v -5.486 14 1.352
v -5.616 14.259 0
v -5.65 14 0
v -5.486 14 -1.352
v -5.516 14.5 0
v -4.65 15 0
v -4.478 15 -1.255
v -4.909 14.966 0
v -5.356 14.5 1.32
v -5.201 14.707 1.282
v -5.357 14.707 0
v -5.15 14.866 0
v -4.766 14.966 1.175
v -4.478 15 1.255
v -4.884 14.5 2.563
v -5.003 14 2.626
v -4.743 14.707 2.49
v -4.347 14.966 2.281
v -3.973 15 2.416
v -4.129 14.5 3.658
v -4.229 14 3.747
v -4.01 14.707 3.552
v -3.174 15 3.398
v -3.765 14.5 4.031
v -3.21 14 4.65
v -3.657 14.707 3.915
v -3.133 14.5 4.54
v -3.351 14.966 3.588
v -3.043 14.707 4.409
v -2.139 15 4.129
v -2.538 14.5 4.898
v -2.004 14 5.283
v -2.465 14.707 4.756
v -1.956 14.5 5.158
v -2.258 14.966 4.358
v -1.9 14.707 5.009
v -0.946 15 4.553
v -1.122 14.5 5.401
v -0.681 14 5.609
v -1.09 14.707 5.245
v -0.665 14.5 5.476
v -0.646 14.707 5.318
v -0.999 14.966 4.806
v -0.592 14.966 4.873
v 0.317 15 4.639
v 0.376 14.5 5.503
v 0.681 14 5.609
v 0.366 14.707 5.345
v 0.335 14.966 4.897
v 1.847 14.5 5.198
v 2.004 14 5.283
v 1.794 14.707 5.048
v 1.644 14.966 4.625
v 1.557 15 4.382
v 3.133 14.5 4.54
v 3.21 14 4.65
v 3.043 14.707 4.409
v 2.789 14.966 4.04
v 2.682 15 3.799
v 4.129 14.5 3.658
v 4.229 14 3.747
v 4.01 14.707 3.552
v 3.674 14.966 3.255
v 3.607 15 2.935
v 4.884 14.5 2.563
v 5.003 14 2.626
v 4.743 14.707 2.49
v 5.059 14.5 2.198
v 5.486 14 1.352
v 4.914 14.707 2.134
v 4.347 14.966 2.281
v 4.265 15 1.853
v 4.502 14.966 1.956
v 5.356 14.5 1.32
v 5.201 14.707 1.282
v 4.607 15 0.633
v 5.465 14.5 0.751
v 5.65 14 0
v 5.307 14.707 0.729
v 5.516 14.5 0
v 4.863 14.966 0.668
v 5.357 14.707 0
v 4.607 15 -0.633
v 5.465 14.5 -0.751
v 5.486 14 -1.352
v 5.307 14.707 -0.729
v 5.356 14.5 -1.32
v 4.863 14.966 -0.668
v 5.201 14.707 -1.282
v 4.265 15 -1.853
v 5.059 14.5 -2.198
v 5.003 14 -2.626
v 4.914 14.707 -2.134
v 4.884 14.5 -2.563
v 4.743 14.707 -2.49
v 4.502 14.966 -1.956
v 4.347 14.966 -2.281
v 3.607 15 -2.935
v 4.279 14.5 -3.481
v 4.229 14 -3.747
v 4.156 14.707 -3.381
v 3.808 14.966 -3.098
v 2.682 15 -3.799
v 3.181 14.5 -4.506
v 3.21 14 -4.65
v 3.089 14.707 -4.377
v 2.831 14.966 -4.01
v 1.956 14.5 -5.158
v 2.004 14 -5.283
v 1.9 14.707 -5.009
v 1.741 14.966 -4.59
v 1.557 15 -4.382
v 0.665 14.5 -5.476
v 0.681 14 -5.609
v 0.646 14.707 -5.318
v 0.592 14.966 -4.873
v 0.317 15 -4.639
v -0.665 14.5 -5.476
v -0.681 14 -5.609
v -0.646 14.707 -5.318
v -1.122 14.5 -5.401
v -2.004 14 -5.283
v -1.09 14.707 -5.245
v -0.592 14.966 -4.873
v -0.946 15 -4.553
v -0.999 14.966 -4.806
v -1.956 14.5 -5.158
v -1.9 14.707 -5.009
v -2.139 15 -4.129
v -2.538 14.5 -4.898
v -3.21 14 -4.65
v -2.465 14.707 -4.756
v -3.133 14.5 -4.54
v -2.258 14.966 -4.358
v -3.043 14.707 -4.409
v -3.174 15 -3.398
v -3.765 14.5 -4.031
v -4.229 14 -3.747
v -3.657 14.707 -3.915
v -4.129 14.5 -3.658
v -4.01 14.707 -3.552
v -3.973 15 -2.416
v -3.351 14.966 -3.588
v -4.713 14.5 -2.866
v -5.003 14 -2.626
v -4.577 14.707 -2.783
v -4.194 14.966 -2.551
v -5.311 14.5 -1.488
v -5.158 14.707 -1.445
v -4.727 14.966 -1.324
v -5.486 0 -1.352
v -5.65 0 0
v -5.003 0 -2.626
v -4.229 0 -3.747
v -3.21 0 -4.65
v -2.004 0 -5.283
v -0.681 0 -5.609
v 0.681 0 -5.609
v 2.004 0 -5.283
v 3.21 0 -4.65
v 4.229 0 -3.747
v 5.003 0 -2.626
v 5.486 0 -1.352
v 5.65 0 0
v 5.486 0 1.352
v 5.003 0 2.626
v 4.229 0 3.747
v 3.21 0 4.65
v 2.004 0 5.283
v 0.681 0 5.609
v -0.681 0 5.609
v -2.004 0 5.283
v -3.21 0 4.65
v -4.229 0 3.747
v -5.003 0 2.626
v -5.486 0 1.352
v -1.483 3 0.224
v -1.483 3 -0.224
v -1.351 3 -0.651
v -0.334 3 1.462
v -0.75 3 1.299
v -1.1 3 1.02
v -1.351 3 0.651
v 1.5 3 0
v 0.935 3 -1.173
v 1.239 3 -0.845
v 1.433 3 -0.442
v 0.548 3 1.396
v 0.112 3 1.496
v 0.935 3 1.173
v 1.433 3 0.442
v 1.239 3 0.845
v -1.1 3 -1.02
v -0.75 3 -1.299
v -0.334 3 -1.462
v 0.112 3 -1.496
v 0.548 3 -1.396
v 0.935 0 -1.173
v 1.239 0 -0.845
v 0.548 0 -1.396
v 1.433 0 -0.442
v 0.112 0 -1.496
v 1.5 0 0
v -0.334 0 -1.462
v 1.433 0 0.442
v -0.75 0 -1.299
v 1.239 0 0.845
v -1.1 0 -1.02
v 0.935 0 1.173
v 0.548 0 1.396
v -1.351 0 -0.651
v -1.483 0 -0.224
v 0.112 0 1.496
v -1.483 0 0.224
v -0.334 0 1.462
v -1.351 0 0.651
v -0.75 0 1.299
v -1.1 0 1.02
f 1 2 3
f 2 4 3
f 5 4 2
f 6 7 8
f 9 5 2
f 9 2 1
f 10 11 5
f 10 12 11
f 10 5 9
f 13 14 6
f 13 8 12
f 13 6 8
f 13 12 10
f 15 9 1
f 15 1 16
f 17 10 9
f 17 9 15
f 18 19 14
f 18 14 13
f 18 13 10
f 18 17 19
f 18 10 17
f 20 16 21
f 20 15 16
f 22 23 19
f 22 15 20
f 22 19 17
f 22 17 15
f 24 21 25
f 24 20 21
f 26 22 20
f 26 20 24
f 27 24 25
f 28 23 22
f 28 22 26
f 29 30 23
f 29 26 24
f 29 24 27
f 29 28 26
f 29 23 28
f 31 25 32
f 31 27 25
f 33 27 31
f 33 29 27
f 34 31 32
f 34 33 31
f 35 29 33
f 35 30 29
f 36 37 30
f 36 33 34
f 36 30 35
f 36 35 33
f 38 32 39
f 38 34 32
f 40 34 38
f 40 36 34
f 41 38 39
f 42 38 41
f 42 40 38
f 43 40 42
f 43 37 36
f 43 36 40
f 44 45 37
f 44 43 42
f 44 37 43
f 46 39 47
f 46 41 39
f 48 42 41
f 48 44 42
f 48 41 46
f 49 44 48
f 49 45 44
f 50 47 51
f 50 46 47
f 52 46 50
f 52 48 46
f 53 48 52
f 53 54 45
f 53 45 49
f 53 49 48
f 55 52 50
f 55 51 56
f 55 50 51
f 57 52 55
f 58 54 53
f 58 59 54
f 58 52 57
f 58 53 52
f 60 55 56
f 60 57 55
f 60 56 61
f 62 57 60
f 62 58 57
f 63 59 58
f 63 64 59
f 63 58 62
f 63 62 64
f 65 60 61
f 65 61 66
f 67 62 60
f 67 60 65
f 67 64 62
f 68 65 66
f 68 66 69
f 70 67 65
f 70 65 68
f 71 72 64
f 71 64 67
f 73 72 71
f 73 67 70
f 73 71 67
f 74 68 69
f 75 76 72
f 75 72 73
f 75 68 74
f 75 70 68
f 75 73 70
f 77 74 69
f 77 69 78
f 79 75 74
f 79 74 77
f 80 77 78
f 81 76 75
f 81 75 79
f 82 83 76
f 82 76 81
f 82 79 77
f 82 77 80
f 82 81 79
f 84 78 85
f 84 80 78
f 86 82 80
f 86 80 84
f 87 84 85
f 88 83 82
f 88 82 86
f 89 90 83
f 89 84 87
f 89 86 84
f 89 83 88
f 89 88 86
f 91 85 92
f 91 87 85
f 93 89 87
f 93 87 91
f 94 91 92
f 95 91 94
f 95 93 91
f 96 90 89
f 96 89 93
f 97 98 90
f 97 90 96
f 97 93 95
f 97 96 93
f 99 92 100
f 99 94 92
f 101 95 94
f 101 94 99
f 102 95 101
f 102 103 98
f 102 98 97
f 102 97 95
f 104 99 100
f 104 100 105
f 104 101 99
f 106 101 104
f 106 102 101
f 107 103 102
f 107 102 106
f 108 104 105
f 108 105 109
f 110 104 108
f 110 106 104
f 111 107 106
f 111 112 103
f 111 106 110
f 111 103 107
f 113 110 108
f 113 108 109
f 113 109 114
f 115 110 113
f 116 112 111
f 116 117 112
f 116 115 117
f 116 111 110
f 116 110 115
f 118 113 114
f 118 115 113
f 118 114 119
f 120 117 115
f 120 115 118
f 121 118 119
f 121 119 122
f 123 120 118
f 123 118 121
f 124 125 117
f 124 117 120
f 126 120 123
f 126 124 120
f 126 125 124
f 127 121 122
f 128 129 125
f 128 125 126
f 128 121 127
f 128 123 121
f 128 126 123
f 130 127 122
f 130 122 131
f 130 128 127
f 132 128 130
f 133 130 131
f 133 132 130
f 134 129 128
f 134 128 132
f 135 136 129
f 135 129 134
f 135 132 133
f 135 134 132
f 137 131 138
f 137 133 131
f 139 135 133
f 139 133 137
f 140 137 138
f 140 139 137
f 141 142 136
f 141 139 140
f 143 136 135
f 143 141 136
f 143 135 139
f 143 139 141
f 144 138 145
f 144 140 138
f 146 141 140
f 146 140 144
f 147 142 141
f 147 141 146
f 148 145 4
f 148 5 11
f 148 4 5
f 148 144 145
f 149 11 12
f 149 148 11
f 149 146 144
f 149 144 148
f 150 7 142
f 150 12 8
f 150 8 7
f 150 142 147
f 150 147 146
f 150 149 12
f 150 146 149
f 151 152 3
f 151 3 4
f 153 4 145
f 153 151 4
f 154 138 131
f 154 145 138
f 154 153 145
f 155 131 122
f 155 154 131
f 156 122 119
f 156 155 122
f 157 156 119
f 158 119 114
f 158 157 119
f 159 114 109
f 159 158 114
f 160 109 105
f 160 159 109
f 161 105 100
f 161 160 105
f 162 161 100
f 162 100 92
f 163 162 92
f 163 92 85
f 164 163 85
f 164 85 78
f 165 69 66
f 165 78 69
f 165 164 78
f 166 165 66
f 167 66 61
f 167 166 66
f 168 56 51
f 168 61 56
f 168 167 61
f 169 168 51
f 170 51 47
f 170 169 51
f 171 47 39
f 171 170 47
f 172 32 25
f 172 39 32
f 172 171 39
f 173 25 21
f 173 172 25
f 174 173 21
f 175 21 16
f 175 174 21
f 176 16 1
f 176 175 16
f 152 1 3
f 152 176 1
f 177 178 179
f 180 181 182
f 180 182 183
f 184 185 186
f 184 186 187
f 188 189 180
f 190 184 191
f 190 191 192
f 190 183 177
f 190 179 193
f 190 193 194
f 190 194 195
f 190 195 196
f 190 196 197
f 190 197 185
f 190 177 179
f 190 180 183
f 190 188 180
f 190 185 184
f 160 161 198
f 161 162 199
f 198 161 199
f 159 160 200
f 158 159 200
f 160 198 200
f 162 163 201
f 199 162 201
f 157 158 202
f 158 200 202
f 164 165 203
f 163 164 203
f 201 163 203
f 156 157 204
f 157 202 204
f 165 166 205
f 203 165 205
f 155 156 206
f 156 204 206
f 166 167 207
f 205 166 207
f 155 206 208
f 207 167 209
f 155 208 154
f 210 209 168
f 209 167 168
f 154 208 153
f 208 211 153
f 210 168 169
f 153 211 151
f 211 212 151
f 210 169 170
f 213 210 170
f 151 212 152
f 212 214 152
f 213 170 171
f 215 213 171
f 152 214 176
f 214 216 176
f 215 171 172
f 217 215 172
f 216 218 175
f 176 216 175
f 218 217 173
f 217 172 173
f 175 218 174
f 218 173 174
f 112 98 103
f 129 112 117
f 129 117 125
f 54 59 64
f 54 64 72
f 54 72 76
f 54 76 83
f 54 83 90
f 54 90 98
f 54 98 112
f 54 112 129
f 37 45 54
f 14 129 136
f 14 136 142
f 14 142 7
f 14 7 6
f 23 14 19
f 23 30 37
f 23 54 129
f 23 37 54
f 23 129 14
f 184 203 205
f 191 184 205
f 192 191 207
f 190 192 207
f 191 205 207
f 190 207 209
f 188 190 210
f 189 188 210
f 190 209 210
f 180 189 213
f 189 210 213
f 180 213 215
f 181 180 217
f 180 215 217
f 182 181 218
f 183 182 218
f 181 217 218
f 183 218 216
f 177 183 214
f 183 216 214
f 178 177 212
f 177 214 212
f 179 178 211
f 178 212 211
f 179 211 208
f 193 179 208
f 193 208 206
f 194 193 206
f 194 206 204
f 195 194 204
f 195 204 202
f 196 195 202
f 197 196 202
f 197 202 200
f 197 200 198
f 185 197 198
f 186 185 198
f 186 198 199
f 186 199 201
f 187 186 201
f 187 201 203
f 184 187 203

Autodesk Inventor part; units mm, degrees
ref_plane "YZ Plane" through (0, 0, 0) normal (1, 0, 0) x (0, 1, 0)
ref_plane "XZ Plane" through (0, 0, 0) normal (0, 1, 0) x (-1, 0, 0)
ref_plane "XY Plane" through (0, 0, 0) normal (0, 0, 1) x (1, 0, 0)
sketch "Sketch1" plane through (0, 0, 0) normal (0, 1, 0) x (-1, 0, 0)
  circle A0 centre (0, 0) radius 5.65
  dimension "d0" = 11.3
extrude "Extrusion1" add sketch "Sketch1" along normal blind 15
sketch "Sketch2" plane through (0, 0, 0) normal (0, -1, 0) x (1, 0, 0)
  circle A0 centre (0, 0) radius 1.5
  dimension "d3" = 3
extrude "Extrusion2" cut sketch "Sketch2" against normal blind 3
fillet "Fillet1" radius 1 1 edges at (5.65, 15, 0)
properties part number "Pieza de Silicona"
